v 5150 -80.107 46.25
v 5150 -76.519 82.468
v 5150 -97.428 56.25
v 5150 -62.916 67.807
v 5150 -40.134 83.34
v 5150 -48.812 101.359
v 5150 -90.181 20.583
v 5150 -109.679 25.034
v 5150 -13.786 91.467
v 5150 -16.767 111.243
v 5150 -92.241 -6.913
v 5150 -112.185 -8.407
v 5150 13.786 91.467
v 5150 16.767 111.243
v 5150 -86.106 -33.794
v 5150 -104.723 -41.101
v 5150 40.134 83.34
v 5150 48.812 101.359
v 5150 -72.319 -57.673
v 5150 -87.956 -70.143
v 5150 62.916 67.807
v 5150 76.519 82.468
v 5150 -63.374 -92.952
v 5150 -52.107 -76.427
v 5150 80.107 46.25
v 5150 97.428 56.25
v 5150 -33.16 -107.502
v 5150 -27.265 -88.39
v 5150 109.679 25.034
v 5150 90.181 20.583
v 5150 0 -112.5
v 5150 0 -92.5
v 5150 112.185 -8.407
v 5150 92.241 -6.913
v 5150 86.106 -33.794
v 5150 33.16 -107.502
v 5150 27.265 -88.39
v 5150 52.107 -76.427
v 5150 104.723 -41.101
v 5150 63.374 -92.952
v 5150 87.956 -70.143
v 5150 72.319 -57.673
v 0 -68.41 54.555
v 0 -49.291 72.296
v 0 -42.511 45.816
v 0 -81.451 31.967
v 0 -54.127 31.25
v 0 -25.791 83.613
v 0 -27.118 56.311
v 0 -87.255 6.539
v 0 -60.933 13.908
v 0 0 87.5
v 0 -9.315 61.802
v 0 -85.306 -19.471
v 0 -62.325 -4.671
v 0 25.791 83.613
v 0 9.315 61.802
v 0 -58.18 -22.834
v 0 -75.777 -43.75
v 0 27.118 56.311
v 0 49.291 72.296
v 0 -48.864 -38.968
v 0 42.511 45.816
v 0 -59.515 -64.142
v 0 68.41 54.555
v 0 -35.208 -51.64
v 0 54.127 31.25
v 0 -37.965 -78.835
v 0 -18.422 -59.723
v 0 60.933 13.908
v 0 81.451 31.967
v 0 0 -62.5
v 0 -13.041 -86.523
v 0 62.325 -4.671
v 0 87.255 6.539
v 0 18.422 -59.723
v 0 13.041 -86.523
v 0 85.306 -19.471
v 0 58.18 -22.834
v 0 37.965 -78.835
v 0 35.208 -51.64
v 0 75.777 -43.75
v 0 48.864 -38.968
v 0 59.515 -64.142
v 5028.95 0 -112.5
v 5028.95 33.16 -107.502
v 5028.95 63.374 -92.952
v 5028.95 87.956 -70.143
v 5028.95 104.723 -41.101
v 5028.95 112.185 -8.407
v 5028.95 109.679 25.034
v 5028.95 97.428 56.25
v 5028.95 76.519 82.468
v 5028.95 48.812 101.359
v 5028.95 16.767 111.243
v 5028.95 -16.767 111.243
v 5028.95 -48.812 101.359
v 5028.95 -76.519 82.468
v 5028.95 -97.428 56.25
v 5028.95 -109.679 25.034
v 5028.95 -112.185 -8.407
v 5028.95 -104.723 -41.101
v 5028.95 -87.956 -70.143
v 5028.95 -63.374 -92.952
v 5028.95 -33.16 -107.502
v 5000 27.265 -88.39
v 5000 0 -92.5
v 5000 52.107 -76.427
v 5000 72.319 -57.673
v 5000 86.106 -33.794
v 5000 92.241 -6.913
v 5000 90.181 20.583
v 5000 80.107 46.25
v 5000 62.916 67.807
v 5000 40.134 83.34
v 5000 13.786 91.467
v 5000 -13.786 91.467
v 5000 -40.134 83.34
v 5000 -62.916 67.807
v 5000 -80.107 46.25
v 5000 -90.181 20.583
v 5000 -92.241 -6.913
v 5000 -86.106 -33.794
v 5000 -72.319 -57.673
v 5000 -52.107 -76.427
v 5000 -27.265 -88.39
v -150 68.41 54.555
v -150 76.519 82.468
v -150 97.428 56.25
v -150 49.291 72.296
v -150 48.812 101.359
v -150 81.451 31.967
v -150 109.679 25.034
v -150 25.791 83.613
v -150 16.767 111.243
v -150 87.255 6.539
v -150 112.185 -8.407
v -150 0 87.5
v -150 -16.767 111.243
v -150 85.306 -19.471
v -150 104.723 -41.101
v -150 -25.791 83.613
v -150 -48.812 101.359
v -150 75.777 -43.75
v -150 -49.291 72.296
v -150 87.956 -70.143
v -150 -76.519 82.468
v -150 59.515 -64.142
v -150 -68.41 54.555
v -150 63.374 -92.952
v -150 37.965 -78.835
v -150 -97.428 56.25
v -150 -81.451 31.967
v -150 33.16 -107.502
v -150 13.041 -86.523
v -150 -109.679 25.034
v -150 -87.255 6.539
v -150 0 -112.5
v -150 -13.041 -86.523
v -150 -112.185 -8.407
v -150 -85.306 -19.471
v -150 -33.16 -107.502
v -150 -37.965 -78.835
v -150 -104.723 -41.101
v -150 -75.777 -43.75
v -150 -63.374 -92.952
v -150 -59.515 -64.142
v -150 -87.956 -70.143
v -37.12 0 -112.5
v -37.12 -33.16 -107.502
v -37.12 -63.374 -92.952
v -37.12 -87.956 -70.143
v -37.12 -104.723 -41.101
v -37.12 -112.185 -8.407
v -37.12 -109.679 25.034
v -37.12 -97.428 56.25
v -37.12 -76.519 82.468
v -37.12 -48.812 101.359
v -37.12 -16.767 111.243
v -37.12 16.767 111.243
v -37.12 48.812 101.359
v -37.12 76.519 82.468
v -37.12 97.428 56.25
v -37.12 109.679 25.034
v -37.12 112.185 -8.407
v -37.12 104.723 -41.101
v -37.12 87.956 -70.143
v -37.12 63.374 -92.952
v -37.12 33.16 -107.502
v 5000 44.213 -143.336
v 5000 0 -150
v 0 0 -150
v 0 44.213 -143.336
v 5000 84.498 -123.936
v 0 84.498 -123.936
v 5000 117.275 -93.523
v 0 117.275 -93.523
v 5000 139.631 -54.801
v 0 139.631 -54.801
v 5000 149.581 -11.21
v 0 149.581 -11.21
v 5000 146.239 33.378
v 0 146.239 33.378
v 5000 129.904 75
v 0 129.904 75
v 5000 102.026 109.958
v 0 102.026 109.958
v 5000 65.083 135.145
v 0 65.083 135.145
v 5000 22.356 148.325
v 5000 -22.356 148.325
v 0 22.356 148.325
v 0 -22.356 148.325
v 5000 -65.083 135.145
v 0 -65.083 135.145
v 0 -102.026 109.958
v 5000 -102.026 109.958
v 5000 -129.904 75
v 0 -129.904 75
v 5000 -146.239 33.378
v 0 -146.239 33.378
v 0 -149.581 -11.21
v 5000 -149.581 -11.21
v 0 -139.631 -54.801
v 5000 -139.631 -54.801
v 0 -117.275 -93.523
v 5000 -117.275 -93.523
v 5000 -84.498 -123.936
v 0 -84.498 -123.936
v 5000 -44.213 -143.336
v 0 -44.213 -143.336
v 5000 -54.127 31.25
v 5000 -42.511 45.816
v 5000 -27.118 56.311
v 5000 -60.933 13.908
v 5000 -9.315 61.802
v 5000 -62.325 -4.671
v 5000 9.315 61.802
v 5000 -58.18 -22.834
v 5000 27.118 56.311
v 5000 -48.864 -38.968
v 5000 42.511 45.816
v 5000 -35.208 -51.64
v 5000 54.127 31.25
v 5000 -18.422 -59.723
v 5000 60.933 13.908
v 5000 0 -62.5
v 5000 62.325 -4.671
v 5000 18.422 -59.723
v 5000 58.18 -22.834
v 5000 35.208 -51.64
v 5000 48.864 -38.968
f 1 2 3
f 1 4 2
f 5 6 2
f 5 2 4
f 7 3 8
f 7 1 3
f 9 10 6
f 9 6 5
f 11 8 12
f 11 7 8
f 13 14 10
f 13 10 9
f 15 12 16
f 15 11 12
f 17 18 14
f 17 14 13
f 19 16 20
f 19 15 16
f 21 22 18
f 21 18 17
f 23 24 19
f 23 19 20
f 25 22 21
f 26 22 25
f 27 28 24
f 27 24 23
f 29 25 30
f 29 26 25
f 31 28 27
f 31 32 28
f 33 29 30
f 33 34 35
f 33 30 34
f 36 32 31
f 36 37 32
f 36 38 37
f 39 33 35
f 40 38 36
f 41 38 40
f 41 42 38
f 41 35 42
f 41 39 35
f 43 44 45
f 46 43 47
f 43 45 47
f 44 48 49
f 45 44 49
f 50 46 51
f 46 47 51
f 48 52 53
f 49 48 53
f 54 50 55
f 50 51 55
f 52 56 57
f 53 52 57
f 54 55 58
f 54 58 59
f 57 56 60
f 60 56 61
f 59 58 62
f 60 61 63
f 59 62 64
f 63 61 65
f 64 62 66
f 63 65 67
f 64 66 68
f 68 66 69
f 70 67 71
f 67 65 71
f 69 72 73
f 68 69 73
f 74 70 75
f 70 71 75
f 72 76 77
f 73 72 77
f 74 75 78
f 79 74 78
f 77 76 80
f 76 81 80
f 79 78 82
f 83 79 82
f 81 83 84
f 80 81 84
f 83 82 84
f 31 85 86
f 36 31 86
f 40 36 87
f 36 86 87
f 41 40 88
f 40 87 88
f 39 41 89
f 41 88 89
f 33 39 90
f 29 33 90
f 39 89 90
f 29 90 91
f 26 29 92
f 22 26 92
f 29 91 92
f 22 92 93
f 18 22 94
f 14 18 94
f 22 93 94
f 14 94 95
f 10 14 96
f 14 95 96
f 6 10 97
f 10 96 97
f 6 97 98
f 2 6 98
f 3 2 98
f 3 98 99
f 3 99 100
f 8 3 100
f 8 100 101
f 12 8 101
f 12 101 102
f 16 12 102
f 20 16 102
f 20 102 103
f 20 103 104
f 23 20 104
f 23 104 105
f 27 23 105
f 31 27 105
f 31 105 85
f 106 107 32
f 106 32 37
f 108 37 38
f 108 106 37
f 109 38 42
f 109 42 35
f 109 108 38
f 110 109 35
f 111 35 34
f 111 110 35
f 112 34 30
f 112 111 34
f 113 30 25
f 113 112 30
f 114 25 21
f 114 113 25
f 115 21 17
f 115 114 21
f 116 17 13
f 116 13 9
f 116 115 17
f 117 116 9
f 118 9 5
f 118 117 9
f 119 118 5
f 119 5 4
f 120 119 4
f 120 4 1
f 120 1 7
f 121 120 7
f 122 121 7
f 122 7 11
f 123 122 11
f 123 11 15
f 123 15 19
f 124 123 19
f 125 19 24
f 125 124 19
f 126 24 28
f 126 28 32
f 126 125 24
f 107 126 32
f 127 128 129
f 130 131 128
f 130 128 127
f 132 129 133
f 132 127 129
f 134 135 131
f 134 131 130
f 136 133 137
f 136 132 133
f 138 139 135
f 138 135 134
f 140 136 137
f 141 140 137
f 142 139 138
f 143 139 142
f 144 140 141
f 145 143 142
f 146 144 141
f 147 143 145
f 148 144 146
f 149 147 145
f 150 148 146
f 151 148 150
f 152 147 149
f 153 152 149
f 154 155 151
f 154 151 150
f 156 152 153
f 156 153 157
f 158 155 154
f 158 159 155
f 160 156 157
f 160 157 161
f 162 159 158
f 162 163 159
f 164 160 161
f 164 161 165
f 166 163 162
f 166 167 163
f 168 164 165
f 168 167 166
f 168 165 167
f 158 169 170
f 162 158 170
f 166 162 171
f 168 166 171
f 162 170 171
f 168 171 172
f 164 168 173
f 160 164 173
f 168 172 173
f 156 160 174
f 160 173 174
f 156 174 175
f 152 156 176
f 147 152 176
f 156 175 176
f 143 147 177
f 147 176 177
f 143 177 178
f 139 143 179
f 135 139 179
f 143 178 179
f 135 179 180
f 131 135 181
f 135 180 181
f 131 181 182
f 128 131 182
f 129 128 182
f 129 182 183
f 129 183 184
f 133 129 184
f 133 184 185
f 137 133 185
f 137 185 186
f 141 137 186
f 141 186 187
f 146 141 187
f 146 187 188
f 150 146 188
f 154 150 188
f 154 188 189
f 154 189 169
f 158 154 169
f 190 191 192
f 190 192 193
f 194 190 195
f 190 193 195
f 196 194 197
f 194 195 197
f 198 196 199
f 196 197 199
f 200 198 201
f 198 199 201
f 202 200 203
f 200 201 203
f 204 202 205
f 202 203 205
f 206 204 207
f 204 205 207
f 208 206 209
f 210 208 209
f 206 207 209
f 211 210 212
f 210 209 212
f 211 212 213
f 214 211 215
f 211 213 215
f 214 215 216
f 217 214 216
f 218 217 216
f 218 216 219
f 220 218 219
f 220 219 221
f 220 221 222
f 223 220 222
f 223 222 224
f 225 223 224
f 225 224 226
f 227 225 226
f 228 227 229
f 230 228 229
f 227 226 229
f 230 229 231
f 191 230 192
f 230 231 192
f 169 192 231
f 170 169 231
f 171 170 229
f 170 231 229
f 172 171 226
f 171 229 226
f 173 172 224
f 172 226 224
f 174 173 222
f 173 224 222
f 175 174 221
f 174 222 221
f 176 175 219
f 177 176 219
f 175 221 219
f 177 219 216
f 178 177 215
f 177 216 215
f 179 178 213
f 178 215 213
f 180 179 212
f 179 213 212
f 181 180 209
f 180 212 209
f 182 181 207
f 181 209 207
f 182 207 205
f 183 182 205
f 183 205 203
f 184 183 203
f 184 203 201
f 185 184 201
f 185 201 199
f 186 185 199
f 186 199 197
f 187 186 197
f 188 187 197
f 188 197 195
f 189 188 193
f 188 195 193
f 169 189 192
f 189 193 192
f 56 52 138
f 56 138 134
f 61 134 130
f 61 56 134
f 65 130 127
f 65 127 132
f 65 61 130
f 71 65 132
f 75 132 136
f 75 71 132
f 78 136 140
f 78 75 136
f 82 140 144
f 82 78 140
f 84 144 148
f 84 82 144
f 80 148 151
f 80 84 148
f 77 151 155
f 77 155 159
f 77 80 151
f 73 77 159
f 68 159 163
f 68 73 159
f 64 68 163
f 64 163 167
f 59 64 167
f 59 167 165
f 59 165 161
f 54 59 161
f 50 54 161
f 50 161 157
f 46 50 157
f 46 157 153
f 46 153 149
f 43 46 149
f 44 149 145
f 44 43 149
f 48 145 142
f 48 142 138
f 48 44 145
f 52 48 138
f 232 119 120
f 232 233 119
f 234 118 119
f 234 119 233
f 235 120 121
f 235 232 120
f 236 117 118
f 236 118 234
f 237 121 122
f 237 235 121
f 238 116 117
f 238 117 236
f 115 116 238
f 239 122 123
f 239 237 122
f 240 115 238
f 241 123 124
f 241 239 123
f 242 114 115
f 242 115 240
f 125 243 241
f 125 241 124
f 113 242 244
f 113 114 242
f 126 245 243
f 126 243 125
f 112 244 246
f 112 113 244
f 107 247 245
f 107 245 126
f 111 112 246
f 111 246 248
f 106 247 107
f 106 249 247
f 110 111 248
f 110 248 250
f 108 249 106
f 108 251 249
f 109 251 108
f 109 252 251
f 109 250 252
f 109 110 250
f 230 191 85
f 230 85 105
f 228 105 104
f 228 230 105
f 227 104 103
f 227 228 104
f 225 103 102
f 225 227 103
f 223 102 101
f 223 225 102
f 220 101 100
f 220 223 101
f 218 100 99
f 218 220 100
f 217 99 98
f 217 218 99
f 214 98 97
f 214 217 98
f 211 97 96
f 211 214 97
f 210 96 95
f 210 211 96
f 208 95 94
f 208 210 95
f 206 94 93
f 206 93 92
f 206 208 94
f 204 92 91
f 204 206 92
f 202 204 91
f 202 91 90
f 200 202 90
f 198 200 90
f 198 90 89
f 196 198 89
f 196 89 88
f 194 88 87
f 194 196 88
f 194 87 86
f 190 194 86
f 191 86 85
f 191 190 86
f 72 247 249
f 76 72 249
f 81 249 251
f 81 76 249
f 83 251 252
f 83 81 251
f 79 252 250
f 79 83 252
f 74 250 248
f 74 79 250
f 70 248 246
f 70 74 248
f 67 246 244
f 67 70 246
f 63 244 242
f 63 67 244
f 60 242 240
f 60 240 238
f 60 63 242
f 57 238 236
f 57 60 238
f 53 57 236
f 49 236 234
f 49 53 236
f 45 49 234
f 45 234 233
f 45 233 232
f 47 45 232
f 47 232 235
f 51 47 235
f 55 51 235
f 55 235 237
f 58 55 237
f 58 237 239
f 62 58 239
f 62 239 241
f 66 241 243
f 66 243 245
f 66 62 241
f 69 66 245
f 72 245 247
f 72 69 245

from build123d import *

# Parameters (mm, degrees)
SKETCH1_R           = 150
SKETCH1_R_2         = 62.5
BOSS_EXTRUDE1_DEPTH = 5000
SKETCH2_R           = 112.5
SKETCH2_R_2         = 92.5
BOSS_EXTRUDE2_DEPTH = 150
SKETCH6_R           = 112.5
SKETCH6_R_2         = 87.5
BOSS_EXTRUDE3_DEPTH = 150


with BuildPart() as part:
    # Sketch1 → Boss-Extrude1 (new body)
    with BuildSketch(Plane(origin=(0, 0, 0), x_dir=(0, 0, -1), z_dir=(1, 0, 0))):
        Circle(SKETCH1_R)
        Circle(SKETCH1_R_2, mode=Mode.SUBTRACT)
    extrude(amount=BOSS_EXTRUDE1_DEPTH)



with BuildPart() as body_2:
    # Sketch2 → Boss-Extrude2 (new body)
    with BuildSketch(Plane(origin=(5000, 0, 0), x_dir=(0, 0, -1), z_dir=(1, 0, 0))):
        Circle(SKETCH2_R)
        Circle(SKETCH2_R_2, mode=Mode.SUBTRACT)
    extrude(amount=BOSS_EXTRUDE2_DEPTH)


with BuildPart() as part_1:
    add(part.part)

    add(body_2.part)  # Revolve1 merges body 2
    # Sketch4 → Revolve1 (revolve)
    with BuildSketch(Plane.XY, mode=Mode.PRIVATE) as revolve1_sk:
        Polygon((5000, 150), (5000, 112.5), (5028.950183413, 112.5), align=None)
    revolve(revolve1_sk.sketch.rotate(Axis((5128.632077333, 0, 0), (-1, 0, 0)), 90), axis=Axis((5128.632077333, 0, 0), (-1, 0, 0)))



with BuildPart() as body_2_2:
    # Sketch6 → Boss-Extrude3 (new body)
    with BuildSketch(Plane.ZY):
        with Locations(Location((0, 0, 0), (0, 0, 180))):
            Circle(SKETCH6_R)
        Circle(SKETCH6_R_2, mode=Mode.SUBTRACT)
    extrude(amount=BOSS_EXTRUDE3_DEPTH)


with BuildPart() as part_2:
    add(part_1.part)

    add(body_2_2.part)  # Revolve2 merges body 2 2
    # Sketch7 → Revolve2 (revolve)
    with BuildSketch(Plane.XY, mode=Mode.PRIVATE) as revolve2_sk:
        Polygon((0, 150), (0, 112.5), (-37.119562434, 112.5), align=None)
    revolve(revolve2_sk.sketch.rotate(Axis((0, 0, 0), (-1, 0, 0)), 90), axis=Axis((0, 0, 0), (-1, 0, 0)))


solid = part_2.part
